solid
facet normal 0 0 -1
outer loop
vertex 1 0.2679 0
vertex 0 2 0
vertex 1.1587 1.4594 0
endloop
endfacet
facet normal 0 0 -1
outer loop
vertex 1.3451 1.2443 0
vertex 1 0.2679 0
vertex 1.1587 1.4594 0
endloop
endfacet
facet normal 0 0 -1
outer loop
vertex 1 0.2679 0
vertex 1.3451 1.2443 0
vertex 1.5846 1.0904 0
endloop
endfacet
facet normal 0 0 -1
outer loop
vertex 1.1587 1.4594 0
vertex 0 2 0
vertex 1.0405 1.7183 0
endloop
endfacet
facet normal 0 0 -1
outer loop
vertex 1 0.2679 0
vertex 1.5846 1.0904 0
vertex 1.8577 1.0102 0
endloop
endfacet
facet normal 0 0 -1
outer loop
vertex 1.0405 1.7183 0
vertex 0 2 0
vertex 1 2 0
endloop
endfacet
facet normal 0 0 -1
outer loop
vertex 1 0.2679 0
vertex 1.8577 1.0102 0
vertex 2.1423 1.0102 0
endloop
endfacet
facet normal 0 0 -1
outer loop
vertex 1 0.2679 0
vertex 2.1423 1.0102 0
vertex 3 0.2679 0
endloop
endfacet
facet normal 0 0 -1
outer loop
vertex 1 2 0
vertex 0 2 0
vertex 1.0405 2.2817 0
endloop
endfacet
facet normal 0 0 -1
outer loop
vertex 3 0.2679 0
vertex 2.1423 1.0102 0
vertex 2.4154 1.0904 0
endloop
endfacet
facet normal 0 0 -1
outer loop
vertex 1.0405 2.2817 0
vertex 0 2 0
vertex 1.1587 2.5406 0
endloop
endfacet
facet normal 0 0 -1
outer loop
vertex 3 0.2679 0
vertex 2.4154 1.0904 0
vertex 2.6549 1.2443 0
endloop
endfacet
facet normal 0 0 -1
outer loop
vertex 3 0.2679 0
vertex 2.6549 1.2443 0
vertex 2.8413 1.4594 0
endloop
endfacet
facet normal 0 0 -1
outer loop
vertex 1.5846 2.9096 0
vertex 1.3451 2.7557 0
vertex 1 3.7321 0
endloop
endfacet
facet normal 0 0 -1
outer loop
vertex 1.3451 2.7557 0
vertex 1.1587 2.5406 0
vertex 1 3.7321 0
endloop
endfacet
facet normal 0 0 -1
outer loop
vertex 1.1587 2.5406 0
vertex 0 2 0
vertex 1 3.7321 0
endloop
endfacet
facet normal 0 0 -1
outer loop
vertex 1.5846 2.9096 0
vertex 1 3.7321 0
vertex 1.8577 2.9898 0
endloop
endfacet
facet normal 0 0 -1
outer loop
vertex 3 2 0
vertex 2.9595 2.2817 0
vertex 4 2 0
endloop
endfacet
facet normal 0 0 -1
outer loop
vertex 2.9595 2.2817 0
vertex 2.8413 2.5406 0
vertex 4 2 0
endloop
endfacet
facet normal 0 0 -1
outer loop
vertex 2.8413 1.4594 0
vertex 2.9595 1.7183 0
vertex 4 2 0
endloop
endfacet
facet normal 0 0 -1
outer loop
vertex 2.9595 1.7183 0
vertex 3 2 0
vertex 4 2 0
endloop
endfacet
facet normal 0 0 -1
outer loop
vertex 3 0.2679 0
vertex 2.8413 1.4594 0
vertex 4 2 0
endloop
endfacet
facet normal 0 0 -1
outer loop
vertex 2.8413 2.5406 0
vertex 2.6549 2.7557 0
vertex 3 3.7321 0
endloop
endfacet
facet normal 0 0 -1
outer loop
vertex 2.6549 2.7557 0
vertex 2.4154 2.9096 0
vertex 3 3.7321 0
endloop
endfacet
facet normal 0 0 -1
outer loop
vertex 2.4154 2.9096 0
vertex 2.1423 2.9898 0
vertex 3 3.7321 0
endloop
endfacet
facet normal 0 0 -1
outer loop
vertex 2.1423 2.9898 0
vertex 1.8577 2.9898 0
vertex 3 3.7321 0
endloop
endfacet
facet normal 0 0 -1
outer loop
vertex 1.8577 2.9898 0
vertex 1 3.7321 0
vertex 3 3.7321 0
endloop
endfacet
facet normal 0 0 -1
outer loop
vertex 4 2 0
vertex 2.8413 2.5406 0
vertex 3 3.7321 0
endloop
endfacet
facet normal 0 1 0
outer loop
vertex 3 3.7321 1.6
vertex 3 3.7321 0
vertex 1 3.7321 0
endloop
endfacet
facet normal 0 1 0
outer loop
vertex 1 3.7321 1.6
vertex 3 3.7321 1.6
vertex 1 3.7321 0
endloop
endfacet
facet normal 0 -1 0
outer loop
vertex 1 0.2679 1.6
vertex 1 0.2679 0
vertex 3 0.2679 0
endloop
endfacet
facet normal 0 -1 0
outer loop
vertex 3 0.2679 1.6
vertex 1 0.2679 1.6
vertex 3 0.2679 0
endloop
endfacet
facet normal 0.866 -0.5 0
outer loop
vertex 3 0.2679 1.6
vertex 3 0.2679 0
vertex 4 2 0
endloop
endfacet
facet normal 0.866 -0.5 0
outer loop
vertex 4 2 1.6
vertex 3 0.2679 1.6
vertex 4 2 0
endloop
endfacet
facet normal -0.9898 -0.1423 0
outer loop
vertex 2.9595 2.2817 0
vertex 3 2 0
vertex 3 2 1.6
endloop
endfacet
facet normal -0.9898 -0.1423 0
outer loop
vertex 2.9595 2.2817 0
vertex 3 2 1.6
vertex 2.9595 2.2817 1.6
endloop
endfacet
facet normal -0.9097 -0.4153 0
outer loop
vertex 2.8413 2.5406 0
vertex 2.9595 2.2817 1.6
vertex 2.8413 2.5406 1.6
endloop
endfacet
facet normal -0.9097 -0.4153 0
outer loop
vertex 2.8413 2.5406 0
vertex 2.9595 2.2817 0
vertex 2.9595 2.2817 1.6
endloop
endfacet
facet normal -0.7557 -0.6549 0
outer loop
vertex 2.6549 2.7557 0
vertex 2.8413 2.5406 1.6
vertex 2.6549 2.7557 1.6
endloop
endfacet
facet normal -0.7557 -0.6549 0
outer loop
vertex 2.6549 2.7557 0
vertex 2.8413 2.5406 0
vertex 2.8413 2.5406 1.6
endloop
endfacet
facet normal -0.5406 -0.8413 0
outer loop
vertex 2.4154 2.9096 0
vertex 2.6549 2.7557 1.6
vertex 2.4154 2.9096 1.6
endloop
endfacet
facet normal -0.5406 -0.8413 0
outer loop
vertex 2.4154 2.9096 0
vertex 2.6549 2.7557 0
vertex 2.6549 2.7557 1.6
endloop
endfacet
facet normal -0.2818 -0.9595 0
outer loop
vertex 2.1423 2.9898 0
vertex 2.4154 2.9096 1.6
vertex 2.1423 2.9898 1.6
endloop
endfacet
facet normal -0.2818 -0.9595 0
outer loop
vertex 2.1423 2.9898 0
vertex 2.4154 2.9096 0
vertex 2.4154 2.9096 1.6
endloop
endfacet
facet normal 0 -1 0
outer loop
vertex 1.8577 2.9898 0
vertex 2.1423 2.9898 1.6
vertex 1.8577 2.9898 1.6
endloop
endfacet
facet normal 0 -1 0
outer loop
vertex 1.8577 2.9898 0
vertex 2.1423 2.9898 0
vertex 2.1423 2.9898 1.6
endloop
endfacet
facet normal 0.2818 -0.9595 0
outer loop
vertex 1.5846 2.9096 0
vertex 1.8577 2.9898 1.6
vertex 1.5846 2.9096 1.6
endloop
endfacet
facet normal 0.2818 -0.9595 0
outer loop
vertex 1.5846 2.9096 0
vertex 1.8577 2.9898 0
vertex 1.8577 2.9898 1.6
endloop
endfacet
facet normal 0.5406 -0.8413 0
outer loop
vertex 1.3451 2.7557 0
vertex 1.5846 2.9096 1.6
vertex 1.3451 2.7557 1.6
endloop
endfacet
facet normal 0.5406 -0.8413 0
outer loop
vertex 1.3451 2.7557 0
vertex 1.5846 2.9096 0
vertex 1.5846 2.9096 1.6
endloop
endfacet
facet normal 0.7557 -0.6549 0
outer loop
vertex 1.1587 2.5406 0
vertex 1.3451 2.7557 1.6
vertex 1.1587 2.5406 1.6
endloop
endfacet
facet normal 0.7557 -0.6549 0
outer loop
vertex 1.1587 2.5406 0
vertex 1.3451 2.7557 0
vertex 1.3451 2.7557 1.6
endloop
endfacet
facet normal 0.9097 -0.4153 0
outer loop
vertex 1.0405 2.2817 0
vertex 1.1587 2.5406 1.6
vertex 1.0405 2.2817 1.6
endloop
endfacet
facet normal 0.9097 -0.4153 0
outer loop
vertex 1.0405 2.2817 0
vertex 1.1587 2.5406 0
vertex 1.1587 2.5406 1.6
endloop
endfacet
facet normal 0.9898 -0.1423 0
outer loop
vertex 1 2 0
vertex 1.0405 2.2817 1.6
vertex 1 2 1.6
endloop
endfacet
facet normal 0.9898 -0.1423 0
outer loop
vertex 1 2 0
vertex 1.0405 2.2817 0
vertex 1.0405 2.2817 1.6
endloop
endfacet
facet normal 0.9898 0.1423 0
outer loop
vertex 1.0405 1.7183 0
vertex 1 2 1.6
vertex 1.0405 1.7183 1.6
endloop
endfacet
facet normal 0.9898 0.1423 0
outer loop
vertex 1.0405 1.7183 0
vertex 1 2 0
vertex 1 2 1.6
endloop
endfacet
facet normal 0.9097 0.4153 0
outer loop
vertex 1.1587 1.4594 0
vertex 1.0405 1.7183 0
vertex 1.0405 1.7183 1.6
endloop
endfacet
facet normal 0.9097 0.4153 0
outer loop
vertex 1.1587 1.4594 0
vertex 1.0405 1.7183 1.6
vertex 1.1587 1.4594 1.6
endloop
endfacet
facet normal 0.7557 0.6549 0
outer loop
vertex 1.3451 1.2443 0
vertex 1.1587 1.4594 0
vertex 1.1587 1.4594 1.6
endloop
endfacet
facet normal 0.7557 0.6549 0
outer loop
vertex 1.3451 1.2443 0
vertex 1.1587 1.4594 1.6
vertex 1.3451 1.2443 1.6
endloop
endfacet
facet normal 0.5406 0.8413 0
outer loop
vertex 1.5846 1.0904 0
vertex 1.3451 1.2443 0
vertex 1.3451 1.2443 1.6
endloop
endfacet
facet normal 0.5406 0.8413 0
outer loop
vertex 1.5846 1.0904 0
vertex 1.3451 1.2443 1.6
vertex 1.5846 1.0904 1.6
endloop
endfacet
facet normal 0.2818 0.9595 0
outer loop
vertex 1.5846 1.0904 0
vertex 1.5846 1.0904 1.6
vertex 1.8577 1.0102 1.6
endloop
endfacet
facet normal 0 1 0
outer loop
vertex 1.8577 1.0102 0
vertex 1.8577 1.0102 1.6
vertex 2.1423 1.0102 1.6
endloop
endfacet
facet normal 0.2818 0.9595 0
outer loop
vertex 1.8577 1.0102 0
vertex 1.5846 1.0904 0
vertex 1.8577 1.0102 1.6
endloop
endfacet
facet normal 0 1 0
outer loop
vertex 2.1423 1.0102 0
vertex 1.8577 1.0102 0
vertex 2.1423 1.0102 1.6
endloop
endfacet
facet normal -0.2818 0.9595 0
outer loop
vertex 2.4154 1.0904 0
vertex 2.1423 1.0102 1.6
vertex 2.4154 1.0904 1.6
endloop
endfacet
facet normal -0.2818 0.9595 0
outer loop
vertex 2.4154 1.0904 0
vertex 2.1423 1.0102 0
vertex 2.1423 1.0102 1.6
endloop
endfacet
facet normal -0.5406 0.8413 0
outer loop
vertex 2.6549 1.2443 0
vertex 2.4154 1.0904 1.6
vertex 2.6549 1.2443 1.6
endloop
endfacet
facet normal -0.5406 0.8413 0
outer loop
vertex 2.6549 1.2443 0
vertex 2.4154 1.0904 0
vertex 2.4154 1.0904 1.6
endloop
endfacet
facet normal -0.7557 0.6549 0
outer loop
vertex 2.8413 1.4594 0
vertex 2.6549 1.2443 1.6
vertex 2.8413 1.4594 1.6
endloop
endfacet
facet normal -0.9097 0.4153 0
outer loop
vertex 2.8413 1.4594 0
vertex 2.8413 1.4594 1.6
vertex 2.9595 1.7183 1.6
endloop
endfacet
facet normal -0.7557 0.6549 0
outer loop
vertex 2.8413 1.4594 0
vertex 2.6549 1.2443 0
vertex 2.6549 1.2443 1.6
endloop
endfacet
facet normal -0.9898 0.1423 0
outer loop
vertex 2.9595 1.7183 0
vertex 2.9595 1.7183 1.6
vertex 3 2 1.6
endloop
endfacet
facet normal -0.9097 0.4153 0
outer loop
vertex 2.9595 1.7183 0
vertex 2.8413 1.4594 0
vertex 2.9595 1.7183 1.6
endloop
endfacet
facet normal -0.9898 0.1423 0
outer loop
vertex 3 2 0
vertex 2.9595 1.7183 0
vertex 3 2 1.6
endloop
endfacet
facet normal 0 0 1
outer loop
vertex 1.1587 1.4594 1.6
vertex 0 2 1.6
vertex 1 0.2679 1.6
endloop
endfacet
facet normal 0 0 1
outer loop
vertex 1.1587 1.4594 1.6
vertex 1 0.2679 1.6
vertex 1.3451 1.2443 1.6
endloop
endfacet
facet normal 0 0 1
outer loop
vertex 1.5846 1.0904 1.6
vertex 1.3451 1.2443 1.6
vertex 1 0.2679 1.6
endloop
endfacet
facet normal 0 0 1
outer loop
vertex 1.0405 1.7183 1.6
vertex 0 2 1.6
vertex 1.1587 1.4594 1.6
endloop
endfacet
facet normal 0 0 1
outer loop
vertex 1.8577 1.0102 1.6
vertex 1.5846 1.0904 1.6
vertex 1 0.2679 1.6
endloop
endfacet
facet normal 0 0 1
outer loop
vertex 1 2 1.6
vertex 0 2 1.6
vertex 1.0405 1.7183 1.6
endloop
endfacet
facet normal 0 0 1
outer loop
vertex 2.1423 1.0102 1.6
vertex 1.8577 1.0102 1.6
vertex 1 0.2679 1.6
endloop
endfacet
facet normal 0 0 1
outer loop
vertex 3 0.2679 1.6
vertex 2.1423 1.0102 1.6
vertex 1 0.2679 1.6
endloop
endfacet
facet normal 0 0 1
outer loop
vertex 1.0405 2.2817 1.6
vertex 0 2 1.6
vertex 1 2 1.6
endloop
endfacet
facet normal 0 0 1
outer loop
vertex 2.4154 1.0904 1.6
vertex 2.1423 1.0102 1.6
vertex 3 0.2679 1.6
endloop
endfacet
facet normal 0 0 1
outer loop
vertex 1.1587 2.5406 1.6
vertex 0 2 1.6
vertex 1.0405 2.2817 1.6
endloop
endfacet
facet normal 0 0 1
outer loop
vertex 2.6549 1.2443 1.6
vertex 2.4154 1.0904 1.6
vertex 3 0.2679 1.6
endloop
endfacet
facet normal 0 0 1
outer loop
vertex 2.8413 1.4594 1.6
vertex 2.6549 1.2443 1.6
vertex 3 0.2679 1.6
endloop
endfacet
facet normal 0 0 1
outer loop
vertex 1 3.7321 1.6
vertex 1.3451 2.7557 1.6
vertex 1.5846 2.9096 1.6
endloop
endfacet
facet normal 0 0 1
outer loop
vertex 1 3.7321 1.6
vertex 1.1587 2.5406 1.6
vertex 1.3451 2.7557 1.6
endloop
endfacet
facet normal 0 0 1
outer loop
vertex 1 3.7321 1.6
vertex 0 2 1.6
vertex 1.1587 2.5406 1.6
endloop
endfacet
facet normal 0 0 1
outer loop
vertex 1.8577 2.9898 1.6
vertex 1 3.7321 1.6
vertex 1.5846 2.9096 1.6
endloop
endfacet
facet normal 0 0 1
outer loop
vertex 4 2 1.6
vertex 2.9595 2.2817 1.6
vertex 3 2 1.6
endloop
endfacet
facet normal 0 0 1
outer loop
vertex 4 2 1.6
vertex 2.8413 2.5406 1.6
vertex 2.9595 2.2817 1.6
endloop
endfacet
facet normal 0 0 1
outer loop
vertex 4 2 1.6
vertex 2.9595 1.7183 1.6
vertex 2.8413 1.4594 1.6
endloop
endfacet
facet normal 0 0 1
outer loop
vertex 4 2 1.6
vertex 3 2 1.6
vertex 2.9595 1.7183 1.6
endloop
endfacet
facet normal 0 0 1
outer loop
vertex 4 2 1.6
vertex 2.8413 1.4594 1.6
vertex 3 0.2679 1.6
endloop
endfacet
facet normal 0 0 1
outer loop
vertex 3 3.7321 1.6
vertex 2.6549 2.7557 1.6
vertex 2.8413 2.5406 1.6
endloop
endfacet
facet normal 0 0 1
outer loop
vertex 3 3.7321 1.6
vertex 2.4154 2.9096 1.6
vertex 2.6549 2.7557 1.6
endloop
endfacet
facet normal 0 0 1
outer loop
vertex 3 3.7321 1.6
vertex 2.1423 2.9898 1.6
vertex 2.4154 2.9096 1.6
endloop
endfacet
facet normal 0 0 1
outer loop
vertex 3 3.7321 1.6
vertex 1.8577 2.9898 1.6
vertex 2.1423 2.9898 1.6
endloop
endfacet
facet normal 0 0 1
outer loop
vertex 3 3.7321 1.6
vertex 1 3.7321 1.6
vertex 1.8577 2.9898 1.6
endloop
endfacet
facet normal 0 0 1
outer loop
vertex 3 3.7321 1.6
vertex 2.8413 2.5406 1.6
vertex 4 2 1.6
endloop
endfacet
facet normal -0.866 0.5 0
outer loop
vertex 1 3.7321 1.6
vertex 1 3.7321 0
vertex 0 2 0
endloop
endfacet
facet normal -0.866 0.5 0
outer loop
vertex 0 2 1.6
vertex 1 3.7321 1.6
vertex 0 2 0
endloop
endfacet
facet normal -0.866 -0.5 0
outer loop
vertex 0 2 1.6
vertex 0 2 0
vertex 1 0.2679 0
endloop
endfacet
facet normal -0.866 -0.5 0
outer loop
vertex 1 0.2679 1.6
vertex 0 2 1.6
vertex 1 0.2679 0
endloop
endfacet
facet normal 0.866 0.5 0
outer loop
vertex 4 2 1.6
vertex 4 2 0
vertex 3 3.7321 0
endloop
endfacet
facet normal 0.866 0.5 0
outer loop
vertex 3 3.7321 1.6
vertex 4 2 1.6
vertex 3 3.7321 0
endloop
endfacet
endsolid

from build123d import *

# Parameters (mm, degrees)
CYLINDER_R     = 1
CYLINDER_DEPTH = 1.6
PAD_DEPTH      = 1.6


with BuildPart() as zylinder:
    # Cylinder → Cylinder (new body)
    with BuildSketch(Plane(origin=(2, 2, 0), x_dir=(1, 0, 0), z_dir=(0, 0, 1))):
        Circle(CYLINDER_R)
    extrude(amount=CYLINDER_DEPTH)


with BuildPart() as bolt:
    # Sketch → Pad (new body)
    with BuildSketch(Plane.XY):
        Polygon((0, 2), (1, 0.267949), (3, 0.267949), (4, 2), (3, 3.732051), (1, 3.732051), align=None)
    extrude(amount=PAD_DEPTH)

    # Cut: cut Zylinder
    add(zylinder.part, mode=Mode.SUBTRACT)


solid = bolt.part
